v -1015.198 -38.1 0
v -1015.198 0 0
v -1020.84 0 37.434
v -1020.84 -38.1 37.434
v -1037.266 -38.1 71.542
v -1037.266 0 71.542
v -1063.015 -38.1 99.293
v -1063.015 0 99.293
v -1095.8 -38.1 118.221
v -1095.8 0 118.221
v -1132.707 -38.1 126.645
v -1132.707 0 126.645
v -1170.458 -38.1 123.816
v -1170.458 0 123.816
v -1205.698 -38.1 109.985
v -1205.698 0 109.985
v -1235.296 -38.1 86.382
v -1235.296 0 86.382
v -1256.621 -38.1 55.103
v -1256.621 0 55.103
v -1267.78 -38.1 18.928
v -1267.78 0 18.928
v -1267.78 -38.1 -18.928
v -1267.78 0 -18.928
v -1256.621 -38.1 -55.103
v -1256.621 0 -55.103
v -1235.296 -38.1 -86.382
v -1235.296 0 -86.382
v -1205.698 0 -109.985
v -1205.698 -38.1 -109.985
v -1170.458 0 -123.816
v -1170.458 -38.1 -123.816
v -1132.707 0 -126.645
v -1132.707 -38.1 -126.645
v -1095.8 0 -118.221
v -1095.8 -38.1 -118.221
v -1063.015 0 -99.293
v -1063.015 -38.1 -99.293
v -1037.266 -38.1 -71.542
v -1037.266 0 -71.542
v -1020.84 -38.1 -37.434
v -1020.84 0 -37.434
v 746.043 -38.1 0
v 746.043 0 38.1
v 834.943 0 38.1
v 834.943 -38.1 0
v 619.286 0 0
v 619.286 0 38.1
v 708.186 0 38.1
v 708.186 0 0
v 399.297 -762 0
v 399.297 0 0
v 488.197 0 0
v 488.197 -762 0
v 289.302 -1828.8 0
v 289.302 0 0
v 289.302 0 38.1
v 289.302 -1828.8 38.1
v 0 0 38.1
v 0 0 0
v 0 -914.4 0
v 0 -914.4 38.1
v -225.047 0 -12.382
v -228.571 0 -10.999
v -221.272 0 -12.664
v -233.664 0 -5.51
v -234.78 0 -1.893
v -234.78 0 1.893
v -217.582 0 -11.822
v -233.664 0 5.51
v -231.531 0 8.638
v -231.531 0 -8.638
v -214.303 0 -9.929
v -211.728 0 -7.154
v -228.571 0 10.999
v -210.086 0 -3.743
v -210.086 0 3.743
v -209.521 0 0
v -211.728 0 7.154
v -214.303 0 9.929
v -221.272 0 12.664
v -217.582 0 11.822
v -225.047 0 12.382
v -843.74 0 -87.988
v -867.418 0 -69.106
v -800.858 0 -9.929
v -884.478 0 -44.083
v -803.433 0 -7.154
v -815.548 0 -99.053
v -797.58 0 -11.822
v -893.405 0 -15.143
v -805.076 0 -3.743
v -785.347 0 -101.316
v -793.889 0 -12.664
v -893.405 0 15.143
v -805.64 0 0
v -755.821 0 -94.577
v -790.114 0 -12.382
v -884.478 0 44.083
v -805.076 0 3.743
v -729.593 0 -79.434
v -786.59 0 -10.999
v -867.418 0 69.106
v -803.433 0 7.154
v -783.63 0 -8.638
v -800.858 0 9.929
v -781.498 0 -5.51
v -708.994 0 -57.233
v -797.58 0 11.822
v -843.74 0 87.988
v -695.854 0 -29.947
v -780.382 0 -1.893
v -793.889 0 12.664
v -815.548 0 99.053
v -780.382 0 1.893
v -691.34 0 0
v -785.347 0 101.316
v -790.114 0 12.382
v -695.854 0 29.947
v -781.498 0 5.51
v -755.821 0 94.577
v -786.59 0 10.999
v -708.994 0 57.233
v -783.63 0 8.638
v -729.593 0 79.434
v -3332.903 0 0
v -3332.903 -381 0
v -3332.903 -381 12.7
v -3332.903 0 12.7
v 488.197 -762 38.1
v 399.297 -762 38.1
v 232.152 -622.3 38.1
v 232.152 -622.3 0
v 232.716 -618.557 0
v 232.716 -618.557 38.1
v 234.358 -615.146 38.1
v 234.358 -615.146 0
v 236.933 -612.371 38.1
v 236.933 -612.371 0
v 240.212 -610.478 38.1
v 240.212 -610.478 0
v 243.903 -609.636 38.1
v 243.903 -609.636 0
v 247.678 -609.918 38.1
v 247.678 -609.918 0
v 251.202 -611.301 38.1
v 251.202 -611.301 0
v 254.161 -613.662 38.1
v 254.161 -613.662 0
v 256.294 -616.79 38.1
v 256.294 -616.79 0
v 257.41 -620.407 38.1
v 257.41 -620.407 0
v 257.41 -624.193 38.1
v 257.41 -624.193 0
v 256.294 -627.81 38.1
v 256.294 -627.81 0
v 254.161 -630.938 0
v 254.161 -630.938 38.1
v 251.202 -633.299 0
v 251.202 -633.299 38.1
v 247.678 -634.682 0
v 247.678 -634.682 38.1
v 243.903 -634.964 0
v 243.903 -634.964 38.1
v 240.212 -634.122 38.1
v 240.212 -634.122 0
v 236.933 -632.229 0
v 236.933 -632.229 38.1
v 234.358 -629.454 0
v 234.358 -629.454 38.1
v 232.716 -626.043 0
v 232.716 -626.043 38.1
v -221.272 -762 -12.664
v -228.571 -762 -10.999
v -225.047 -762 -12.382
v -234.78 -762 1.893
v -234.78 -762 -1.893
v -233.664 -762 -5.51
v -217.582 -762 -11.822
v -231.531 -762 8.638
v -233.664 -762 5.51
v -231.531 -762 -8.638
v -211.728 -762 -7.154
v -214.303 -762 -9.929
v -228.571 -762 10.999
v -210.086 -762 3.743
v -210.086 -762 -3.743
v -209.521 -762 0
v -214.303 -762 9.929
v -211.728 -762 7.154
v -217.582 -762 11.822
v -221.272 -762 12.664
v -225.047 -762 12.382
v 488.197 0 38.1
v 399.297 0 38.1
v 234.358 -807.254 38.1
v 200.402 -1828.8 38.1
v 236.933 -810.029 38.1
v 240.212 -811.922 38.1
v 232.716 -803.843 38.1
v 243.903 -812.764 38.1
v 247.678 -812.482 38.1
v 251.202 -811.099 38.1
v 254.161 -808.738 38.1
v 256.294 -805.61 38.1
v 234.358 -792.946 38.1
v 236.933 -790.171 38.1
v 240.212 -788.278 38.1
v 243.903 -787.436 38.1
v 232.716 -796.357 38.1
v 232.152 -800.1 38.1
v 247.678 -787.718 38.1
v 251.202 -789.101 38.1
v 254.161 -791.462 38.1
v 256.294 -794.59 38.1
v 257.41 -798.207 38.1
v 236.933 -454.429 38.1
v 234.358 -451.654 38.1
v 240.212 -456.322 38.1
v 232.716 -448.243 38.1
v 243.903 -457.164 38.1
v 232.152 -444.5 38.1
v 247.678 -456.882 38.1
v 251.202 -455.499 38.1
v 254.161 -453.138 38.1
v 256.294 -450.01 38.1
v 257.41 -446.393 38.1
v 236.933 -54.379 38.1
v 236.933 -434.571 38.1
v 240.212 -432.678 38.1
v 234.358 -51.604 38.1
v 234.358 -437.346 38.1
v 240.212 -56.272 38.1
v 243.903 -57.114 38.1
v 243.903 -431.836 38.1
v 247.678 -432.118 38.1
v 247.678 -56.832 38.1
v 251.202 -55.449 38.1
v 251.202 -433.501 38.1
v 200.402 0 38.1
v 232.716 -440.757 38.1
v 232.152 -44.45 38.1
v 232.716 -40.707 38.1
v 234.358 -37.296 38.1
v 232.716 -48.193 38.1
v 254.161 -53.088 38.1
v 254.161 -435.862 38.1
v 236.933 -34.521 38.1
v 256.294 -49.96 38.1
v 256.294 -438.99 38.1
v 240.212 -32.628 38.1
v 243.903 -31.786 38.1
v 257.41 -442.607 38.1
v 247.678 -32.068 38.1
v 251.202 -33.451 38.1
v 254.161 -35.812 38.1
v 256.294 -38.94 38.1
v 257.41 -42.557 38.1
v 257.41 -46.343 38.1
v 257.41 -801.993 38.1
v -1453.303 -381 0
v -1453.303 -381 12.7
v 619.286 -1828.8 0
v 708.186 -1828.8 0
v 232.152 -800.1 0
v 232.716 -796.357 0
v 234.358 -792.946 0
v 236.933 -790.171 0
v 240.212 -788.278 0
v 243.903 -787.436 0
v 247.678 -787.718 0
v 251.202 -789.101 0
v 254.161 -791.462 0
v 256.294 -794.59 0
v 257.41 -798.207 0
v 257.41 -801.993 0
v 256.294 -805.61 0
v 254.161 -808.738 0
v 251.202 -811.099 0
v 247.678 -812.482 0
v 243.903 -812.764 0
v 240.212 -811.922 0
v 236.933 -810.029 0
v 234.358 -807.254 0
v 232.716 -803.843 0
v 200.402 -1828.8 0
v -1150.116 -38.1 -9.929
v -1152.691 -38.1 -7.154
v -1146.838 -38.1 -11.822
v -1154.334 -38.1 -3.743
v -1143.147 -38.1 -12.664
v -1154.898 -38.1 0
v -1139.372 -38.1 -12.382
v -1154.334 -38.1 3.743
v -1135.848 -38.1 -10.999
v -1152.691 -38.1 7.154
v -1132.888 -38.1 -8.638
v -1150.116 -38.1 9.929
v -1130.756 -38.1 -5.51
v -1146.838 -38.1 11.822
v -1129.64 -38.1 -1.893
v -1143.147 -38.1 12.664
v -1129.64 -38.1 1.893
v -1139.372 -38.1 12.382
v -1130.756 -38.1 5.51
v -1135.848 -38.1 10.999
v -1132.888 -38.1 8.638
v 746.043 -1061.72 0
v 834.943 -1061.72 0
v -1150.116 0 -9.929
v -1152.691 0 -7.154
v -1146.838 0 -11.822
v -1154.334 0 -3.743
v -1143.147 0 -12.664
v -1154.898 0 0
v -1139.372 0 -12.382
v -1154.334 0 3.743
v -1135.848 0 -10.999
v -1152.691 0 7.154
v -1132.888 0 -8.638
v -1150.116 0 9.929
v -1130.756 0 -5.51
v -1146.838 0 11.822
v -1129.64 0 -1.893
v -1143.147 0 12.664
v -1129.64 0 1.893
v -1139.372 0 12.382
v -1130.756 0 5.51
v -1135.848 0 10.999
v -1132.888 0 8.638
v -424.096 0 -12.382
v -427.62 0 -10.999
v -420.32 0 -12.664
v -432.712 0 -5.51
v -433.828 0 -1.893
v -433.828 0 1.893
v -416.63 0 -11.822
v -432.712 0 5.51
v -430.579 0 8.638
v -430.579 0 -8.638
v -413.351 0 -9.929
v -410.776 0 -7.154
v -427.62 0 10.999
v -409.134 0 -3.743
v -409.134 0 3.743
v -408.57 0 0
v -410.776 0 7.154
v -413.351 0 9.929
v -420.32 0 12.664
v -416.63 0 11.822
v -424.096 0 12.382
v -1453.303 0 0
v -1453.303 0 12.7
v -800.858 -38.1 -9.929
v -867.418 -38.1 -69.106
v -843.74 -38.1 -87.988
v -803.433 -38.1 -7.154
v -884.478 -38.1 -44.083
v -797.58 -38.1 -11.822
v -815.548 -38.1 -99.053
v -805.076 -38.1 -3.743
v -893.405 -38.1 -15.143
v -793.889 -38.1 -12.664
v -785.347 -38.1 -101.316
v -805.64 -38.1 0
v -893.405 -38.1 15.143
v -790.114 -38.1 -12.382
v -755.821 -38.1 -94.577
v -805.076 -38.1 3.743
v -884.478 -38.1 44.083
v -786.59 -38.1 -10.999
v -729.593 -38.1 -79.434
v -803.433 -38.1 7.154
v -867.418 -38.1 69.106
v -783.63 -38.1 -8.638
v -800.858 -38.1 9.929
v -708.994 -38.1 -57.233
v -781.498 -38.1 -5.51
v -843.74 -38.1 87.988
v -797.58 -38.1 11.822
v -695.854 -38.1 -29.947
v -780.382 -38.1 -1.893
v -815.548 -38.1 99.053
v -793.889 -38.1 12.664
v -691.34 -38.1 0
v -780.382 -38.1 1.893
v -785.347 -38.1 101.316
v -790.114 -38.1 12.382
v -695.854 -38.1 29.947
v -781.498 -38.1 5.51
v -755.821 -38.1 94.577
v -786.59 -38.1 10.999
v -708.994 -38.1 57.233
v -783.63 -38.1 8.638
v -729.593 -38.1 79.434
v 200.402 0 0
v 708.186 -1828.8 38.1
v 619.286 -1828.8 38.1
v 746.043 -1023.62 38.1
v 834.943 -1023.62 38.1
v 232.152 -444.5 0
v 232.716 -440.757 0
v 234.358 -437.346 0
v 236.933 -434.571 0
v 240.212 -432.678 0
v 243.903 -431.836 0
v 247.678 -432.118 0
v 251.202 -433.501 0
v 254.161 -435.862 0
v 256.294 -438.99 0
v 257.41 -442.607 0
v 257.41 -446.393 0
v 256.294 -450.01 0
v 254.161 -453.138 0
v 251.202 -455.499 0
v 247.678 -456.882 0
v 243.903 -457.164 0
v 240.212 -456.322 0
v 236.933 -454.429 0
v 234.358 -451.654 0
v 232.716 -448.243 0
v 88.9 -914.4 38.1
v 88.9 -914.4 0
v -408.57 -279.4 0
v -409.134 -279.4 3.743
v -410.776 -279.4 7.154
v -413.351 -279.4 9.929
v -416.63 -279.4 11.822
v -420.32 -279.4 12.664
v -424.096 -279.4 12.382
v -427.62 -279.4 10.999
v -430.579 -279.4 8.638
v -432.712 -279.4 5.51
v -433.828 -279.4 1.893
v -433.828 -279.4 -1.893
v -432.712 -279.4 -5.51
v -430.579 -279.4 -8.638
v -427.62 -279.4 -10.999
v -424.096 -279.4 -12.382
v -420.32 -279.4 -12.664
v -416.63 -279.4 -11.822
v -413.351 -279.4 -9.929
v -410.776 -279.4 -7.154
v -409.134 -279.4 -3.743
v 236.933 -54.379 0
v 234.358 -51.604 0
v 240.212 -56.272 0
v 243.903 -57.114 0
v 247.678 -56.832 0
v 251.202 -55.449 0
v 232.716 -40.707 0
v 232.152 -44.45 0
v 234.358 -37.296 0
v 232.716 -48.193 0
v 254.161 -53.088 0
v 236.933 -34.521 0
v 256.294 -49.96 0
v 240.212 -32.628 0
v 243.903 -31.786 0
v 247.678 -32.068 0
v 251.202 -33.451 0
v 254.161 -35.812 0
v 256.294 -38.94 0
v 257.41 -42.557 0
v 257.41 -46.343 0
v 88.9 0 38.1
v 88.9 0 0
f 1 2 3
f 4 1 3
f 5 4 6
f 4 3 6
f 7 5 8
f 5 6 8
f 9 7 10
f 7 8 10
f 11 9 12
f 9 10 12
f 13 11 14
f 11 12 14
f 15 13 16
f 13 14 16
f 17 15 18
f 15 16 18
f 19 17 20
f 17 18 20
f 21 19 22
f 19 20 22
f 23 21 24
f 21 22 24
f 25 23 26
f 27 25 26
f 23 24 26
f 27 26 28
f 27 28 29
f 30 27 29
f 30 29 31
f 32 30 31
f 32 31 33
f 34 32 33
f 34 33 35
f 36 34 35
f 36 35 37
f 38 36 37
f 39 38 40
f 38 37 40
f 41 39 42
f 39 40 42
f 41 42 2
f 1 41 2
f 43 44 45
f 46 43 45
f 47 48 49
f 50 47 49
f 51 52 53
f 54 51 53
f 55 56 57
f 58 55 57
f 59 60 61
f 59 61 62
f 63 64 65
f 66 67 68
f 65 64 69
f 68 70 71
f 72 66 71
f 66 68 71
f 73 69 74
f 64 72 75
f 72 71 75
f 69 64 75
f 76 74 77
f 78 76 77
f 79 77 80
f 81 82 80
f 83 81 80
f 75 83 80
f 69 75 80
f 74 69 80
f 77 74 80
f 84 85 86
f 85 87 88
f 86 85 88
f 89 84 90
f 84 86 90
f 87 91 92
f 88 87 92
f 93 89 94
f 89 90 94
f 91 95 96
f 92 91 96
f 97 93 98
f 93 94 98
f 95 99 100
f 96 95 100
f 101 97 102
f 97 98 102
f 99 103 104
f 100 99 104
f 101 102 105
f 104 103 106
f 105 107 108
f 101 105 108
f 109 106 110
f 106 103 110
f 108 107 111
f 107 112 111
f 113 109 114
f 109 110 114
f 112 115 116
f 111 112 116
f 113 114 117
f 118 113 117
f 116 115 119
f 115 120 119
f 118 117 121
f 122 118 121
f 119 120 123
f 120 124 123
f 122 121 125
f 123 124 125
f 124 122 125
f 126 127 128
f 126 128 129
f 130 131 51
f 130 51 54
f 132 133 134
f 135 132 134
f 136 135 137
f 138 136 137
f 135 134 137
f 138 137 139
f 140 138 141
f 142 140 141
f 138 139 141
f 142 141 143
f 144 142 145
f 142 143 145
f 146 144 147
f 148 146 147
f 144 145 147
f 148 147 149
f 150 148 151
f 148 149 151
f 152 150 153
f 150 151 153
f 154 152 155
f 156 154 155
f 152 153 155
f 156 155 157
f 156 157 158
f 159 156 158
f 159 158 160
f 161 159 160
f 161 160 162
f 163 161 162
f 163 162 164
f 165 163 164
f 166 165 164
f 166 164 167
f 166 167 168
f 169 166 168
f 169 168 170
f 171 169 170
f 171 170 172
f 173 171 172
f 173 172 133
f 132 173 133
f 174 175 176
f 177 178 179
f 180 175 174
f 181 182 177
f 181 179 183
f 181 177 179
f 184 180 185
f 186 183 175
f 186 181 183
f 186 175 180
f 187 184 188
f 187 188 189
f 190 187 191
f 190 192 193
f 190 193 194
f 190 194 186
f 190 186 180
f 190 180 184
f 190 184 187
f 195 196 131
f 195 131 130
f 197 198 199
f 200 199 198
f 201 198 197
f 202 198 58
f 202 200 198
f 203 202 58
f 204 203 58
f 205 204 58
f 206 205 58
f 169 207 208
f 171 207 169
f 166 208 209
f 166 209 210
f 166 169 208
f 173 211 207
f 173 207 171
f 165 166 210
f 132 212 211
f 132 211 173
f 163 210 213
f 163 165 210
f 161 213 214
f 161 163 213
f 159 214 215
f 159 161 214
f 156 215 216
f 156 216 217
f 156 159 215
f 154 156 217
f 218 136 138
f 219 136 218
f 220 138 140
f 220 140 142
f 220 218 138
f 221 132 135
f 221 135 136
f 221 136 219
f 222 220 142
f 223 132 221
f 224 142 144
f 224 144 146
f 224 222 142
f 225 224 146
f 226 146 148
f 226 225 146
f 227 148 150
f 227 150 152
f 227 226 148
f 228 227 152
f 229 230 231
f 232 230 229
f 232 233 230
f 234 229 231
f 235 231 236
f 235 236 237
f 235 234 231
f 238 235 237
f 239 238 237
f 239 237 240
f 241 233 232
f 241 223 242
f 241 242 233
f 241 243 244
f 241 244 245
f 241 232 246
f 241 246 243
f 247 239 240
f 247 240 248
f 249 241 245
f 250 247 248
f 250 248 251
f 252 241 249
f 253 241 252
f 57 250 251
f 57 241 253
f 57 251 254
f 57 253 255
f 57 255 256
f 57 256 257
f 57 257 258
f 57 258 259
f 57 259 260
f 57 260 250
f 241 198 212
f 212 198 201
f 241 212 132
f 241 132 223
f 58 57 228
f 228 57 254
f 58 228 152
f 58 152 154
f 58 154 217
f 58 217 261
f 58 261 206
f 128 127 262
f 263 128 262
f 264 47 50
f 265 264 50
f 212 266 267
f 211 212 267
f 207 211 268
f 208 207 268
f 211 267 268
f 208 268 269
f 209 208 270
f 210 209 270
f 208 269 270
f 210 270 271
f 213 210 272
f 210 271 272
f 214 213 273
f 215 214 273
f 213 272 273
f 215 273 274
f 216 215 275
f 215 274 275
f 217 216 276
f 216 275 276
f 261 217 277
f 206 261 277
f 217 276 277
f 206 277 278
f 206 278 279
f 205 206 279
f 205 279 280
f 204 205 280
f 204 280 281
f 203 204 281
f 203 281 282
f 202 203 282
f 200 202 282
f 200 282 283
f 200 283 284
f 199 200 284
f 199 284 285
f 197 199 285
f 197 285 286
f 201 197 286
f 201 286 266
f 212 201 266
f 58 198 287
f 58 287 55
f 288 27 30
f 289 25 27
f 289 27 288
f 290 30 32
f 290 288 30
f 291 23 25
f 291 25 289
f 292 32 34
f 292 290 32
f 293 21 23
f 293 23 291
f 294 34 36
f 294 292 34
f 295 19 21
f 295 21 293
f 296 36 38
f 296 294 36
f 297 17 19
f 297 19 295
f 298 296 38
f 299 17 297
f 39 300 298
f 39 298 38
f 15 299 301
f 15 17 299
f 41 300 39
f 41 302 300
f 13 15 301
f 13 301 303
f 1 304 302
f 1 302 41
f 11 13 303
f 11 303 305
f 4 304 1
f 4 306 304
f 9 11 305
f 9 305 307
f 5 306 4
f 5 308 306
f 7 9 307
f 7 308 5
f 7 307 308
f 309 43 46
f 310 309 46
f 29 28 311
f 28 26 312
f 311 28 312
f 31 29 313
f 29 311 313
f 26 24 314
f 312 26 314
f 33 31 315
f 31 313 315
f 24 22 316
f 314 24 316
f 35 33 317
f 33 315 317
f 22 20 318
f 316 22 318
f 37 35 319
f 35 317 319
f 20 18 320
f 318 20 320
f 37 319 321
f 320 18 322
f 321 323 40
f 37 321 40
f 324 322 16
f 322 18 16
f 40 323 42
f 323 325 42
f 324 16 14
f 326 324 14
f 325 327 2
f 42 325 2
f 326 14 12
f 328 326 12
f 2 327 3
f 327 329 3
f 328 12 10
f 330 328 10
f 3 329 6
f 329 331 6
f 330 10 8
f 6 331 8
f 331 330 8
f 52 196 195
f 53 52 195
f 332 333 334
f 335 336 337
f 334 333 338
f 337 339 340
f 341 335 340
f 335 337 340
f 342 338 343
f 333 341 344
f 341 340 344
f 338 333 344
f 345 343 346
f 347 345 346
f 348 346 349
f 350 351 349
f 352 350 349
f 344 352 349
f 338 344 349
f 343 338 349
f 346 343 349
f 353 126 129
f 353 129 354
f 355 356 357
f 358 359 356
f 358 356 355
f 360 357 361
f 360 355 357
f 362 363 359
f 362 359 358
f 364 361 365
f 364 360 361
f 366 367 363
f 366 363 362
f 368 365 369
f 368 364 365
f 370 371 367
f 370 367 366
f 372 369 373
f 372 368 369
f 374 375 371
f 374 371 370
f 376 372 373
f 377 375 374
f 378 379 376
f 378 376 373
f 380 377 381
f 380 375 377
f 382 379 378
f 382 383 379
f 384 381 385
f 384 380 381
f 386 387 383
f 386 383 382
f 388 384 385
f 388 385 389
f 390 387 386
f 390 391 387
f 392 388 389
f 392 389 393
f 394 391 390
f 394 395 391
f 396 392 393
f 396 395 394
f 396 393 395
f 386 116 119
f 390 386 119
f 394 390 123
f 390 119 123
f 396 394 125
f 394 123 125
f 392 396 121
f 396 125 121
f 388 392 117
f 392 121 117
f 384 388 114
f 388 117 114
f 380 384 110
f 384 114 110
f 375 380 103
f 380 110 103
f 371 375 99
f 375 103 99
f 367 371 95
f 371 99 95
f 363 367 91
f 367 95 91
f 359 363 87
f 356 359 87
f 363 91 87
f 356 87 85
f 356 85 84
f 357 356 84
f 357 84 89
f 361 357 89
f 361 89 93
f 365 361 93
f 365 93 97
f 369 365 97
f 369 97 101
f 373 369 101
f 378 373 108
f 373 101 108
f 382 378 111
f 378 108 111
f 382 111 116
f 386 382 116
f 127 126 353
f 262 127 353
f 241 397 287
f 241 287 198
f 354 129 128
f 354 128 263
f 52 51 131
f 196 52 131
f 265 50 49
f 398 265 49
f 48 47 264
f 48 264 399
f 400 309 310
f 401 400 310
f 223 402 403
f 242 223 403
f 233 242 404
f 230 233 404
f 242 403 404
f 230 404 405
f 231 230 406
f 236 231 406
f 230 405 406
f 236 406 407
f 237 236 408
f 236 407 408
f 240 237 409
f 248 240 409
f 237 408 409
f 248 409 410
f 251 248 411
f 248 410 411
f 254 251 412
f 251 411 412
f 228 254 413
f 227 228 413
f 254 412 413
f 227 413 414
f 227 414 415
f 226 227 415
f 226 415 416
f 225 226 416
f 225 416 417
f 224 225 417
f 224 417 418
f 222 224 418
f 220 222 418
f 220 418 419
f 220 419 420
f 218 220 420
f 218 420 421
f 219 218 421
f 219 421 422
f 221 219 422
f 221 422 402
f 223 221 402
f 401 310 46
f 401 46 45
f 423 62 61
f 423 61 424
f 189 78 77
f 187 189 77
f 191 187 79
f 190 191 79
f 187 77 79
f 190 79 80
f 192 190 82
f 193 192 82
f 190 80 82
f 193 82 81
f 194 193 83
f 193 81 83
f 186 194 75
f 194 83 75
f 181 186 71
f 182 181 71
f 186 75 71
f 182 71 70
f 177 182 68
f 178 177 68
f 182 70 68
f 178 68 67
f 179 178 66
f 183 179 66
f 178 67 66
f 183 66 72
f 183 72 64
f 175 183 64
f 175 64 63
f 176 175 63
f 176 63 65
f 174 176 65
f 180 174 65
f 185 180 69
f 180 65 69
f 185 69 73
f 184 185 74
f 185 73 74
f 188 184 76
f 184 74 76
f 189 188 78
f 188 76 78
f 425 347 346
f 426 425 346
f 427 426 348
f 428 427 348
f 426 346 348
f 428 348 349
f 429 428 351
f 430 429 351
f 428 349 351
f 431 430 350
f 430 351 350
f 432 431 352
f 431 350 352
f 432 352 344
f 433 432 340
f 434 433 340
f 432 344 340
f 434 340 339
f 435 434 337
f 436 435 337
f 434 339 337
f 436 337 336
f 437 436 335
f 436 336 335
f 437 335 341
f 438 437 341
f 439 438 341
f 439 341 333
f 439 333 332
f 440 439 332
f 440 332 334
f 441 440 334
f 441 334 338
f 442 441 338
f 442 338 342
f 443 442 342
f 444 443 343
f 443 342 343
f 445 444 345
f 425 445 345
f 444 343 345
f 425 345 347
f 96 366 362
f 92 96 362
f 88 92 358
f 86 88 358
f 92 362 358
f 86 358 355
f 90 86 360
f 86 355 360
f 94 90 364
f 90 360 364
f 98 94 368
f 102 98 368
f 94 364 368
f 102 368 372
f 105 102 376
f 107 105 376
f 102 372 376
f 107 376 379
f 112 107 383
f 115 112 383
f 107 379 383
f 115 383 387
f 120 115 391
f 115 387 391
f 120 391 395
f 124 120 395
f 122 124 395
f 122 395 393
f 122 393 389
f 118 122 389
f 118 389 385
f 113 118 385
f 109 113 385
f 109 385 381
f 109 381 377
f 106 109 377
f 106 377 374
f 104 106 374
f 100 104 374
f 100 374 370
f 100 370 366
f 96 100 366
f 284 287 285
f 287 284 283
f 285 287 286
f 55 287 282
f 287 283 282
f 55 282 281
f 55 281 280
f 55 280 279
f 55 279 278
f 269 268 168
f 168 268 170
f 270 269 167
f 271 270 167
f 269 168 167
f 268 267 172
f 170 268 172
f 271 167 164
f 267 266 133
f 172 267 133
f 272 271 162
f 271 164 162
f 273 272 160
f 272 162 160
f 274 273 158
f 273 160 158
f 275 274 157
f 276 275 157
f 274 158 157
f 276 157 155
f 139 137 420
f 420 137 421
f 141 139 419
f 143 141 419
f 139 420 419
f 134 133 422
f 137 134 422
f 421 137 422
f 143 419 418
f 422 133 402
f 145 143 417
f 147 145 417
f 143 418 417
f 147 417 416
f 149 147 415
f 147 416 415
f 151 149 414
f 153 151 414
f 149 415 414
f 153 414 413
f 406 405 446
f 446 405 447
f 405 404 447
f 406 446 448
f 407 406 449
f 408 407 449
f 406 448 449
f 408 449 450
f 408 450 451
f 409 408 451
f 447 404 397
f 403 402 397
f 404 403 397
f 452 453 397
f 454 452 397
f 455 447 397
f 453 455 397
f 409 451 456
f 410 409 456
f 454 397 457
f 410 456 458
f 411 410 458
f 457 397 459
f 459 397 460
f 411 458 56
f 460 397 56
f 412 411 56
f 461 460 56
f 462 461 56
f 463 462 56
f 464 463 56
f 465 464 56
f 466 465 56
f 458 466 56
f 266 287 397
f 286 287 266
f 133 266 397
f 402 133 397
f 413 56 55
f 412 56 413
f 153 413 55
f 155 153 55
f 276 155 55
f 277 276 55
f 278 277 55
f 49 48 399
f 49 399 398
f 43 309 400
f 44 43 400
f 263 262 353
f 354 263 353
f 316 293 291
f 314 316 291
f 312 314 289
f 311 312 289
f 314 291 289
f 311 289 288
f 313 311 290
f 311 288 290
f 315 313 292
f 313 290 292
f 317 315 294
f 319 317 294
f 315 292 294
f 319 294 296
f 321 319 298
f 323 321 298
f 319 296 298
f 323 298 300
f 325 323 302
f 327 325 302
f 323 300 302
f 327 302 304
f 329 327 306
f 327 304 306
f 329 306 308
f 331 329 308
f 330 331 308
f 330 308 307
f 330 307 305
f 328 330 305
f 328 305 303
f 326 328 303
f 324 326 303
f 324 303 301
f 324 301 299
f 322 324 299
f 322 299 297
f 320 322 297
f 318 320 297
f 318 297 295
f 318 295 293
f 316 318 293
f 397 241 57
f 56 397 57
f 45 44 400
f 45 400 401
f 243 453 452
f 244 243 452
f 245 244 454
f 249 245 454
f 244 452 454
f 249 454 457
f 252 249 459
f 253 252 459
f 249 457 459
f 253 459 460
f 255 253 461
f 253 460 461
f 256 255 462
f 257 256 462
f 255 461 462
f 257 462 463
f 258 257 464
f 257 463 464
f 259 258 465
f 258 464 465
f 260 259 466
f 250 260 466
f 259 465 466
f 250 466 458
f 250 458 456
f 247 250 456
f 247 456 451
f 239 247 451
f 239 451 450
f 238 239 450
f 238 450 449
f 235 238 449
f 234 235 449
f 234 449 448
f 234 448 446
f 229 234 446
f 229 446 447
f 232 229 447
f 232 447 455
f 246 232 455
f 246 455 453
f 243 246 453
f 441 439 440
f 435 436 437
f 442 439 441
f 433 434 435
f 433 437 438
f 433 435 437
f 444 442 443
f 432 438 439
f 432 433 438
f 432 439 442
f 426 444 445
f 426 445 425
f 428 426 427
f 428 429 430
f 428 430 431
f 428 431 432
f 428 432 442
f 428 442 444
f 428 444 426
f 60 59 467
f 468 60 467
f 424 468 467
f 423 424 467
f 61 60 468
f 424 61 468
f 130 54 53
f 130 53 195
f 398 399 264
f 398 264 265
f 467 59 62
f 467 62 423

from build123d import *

# Parameters (mm, degrees)
F0_W      = 88.9
F0_H      = 38.1
F1_DEPTH  = 914.4
F2_DEPTH  = 1828.8
F3_DEPTH  = 762
F5_D      = 25.4
F6_W      = 1879.6
F6_H      = 381
F7_DEPTH  = 12.7
F8_R      = 12.7
F9_DEPTH  = 762
F10_DEPTH = 279.4
F11_R     = 101.6
F12_DEPTH = 38.1
F11_R_2   = 127
F13_DEPTH = 38.1
F14_D     = 25.4
F15_D     = 25.4
F16_W     = 88.9
F16_H     = 38.1
F17_DEPTH = 1061.72
F18_SIZE  = 38.09999


# Not quite as in the source:
# - a fillet or chamfer is up to 0.001 mm smaller than in the source, because OpenCascade refuses the exact size


with BuildPart() as f1:
    # F0 (on Front) → F1 (new body)
    with BuildSketch(Plane.XZ):
        with Locations((44.45, 19.05)):
            Rectangle(F0_W, F0_H)
    extrude(amount=F1_DEPTH)


with BuildPart() as f2:
    # F0 (on Front) → F2 (new body)
    with BuildSketch(Plane.XZ):
        with Locations((244.851688537, 19.05)):
            Rectangle(F0_W, F0_H)
    extrude(amount=F2_DEPTH)

    # F5 (through all)
    with Locations(Plane.XY.offset(38.1)):
        with Locations((244.851688537, -44.45), (244.851688537, -444.5), (244.851688537, -622.3), (244.851688537, -800.1)):
            Hole(F5_D / 2)


with BuildPart() as f2b:
    # F0 (on Front) → F2, piece 2 (new body)
    with BuildSketch(Plane.XZ):
        with Locations((663.7364707975, 19.05)):
            Rectangle(F0_W, F0_H)
    extrude(amount=F2_DEPTH)


with BuildPart() as f3:
    # F0 (on Front) → F3 (new body)
    with BuildSketch(Plane.XZ):
        with Locations((443.7466020195, 19.05)):
            Rectangle(F0_W, F0_H)
    extrude(amount=F3_DEPTH)


with BuildPart() as f7:
    # F6 (on Top) → F7 (new body)
    with BuildSketch(Plane.XY):
        with Locations((-2393.1029083252, -190.5)):
            Rectangle(F6_W, F6_H)
    extrude(amount=F7_DEPTH)


with BuildPart() as f9:
    # F8 (on Front) → F9 (new body)
    with BuildSketch(Plane.XZ):
        with Locations((-222.2214488977, 0)):
            Circle(F8_R)
    extrude(amount=F9_DEPTH)


with BuildPart() as f10:
    # F8 (on Front) → F10 (new body)
    with BuildSketch(Plane.XZ):
        with Locations((-421.2695658207, 0)):
            Circle(F8_R)
    extrude(amount=F10_DEPTH)


with BuildPart() as f12:
    # F11 (on Front) → F12 (new body)
    with BuildSketch(Plane.XZ):
        with Locations((-792.9399567111, 0)):
            Circle(F11_R)
    extrude(amount=F12_DEPTH)

    # F14 (through all)
    with Locations(Plane(origin=(0, 0, 0), x_dir=(1, 0, 0), z_dir=(0, 1, 0))):
        with Locations((-792.9399567111, 0), (-1142.1980857849, 0)):
            Hole(F14_D / 2)


with BuildPart() as f13:
    # F11 (on Front) → F13 (new body)
    with BuildSketch(Plane.XZ):
        with Locations((-1142.1980857849, 0)):
            Circle(F11_R_2)
    extrude(amount=F13_DEPTH)

    # F15 (through all)
    with Locations(Plane(origin=(0, 0, 0), x_dir=(1, 0, 0), z_dir=(0, 1, 0))):
        with Locations((-1142.1980857849, 0)):
            Hole(F15_D / 2)


with BuildPart() as f17:
    # F16 (on Front) → F17 (new body)
    with BuildSketch(Plane.XZ):
        with Locations((790.4931433541, 19.05)):
            Rectangle(F16_W, F16_H)
    extrude(amount=F17_DEPTH)

    # F18 (size 38.1 in the source; OpenCascade refuses exactly that, so slightly less here)
    f18_edges = [f17.edges().sort_by_distance(p)[0] for p in [
        (790.493143, -1061.72, 38.1),
        (790.493143, 0, 0),
    ]]
    chamfer(f18_edges, length=F18_SIZE)


solid = Compound([f1.part, f2.part, f2b.part, f3.part, f7.part, f9.part, f10.part, f12.part, f13.part, f17.part])
